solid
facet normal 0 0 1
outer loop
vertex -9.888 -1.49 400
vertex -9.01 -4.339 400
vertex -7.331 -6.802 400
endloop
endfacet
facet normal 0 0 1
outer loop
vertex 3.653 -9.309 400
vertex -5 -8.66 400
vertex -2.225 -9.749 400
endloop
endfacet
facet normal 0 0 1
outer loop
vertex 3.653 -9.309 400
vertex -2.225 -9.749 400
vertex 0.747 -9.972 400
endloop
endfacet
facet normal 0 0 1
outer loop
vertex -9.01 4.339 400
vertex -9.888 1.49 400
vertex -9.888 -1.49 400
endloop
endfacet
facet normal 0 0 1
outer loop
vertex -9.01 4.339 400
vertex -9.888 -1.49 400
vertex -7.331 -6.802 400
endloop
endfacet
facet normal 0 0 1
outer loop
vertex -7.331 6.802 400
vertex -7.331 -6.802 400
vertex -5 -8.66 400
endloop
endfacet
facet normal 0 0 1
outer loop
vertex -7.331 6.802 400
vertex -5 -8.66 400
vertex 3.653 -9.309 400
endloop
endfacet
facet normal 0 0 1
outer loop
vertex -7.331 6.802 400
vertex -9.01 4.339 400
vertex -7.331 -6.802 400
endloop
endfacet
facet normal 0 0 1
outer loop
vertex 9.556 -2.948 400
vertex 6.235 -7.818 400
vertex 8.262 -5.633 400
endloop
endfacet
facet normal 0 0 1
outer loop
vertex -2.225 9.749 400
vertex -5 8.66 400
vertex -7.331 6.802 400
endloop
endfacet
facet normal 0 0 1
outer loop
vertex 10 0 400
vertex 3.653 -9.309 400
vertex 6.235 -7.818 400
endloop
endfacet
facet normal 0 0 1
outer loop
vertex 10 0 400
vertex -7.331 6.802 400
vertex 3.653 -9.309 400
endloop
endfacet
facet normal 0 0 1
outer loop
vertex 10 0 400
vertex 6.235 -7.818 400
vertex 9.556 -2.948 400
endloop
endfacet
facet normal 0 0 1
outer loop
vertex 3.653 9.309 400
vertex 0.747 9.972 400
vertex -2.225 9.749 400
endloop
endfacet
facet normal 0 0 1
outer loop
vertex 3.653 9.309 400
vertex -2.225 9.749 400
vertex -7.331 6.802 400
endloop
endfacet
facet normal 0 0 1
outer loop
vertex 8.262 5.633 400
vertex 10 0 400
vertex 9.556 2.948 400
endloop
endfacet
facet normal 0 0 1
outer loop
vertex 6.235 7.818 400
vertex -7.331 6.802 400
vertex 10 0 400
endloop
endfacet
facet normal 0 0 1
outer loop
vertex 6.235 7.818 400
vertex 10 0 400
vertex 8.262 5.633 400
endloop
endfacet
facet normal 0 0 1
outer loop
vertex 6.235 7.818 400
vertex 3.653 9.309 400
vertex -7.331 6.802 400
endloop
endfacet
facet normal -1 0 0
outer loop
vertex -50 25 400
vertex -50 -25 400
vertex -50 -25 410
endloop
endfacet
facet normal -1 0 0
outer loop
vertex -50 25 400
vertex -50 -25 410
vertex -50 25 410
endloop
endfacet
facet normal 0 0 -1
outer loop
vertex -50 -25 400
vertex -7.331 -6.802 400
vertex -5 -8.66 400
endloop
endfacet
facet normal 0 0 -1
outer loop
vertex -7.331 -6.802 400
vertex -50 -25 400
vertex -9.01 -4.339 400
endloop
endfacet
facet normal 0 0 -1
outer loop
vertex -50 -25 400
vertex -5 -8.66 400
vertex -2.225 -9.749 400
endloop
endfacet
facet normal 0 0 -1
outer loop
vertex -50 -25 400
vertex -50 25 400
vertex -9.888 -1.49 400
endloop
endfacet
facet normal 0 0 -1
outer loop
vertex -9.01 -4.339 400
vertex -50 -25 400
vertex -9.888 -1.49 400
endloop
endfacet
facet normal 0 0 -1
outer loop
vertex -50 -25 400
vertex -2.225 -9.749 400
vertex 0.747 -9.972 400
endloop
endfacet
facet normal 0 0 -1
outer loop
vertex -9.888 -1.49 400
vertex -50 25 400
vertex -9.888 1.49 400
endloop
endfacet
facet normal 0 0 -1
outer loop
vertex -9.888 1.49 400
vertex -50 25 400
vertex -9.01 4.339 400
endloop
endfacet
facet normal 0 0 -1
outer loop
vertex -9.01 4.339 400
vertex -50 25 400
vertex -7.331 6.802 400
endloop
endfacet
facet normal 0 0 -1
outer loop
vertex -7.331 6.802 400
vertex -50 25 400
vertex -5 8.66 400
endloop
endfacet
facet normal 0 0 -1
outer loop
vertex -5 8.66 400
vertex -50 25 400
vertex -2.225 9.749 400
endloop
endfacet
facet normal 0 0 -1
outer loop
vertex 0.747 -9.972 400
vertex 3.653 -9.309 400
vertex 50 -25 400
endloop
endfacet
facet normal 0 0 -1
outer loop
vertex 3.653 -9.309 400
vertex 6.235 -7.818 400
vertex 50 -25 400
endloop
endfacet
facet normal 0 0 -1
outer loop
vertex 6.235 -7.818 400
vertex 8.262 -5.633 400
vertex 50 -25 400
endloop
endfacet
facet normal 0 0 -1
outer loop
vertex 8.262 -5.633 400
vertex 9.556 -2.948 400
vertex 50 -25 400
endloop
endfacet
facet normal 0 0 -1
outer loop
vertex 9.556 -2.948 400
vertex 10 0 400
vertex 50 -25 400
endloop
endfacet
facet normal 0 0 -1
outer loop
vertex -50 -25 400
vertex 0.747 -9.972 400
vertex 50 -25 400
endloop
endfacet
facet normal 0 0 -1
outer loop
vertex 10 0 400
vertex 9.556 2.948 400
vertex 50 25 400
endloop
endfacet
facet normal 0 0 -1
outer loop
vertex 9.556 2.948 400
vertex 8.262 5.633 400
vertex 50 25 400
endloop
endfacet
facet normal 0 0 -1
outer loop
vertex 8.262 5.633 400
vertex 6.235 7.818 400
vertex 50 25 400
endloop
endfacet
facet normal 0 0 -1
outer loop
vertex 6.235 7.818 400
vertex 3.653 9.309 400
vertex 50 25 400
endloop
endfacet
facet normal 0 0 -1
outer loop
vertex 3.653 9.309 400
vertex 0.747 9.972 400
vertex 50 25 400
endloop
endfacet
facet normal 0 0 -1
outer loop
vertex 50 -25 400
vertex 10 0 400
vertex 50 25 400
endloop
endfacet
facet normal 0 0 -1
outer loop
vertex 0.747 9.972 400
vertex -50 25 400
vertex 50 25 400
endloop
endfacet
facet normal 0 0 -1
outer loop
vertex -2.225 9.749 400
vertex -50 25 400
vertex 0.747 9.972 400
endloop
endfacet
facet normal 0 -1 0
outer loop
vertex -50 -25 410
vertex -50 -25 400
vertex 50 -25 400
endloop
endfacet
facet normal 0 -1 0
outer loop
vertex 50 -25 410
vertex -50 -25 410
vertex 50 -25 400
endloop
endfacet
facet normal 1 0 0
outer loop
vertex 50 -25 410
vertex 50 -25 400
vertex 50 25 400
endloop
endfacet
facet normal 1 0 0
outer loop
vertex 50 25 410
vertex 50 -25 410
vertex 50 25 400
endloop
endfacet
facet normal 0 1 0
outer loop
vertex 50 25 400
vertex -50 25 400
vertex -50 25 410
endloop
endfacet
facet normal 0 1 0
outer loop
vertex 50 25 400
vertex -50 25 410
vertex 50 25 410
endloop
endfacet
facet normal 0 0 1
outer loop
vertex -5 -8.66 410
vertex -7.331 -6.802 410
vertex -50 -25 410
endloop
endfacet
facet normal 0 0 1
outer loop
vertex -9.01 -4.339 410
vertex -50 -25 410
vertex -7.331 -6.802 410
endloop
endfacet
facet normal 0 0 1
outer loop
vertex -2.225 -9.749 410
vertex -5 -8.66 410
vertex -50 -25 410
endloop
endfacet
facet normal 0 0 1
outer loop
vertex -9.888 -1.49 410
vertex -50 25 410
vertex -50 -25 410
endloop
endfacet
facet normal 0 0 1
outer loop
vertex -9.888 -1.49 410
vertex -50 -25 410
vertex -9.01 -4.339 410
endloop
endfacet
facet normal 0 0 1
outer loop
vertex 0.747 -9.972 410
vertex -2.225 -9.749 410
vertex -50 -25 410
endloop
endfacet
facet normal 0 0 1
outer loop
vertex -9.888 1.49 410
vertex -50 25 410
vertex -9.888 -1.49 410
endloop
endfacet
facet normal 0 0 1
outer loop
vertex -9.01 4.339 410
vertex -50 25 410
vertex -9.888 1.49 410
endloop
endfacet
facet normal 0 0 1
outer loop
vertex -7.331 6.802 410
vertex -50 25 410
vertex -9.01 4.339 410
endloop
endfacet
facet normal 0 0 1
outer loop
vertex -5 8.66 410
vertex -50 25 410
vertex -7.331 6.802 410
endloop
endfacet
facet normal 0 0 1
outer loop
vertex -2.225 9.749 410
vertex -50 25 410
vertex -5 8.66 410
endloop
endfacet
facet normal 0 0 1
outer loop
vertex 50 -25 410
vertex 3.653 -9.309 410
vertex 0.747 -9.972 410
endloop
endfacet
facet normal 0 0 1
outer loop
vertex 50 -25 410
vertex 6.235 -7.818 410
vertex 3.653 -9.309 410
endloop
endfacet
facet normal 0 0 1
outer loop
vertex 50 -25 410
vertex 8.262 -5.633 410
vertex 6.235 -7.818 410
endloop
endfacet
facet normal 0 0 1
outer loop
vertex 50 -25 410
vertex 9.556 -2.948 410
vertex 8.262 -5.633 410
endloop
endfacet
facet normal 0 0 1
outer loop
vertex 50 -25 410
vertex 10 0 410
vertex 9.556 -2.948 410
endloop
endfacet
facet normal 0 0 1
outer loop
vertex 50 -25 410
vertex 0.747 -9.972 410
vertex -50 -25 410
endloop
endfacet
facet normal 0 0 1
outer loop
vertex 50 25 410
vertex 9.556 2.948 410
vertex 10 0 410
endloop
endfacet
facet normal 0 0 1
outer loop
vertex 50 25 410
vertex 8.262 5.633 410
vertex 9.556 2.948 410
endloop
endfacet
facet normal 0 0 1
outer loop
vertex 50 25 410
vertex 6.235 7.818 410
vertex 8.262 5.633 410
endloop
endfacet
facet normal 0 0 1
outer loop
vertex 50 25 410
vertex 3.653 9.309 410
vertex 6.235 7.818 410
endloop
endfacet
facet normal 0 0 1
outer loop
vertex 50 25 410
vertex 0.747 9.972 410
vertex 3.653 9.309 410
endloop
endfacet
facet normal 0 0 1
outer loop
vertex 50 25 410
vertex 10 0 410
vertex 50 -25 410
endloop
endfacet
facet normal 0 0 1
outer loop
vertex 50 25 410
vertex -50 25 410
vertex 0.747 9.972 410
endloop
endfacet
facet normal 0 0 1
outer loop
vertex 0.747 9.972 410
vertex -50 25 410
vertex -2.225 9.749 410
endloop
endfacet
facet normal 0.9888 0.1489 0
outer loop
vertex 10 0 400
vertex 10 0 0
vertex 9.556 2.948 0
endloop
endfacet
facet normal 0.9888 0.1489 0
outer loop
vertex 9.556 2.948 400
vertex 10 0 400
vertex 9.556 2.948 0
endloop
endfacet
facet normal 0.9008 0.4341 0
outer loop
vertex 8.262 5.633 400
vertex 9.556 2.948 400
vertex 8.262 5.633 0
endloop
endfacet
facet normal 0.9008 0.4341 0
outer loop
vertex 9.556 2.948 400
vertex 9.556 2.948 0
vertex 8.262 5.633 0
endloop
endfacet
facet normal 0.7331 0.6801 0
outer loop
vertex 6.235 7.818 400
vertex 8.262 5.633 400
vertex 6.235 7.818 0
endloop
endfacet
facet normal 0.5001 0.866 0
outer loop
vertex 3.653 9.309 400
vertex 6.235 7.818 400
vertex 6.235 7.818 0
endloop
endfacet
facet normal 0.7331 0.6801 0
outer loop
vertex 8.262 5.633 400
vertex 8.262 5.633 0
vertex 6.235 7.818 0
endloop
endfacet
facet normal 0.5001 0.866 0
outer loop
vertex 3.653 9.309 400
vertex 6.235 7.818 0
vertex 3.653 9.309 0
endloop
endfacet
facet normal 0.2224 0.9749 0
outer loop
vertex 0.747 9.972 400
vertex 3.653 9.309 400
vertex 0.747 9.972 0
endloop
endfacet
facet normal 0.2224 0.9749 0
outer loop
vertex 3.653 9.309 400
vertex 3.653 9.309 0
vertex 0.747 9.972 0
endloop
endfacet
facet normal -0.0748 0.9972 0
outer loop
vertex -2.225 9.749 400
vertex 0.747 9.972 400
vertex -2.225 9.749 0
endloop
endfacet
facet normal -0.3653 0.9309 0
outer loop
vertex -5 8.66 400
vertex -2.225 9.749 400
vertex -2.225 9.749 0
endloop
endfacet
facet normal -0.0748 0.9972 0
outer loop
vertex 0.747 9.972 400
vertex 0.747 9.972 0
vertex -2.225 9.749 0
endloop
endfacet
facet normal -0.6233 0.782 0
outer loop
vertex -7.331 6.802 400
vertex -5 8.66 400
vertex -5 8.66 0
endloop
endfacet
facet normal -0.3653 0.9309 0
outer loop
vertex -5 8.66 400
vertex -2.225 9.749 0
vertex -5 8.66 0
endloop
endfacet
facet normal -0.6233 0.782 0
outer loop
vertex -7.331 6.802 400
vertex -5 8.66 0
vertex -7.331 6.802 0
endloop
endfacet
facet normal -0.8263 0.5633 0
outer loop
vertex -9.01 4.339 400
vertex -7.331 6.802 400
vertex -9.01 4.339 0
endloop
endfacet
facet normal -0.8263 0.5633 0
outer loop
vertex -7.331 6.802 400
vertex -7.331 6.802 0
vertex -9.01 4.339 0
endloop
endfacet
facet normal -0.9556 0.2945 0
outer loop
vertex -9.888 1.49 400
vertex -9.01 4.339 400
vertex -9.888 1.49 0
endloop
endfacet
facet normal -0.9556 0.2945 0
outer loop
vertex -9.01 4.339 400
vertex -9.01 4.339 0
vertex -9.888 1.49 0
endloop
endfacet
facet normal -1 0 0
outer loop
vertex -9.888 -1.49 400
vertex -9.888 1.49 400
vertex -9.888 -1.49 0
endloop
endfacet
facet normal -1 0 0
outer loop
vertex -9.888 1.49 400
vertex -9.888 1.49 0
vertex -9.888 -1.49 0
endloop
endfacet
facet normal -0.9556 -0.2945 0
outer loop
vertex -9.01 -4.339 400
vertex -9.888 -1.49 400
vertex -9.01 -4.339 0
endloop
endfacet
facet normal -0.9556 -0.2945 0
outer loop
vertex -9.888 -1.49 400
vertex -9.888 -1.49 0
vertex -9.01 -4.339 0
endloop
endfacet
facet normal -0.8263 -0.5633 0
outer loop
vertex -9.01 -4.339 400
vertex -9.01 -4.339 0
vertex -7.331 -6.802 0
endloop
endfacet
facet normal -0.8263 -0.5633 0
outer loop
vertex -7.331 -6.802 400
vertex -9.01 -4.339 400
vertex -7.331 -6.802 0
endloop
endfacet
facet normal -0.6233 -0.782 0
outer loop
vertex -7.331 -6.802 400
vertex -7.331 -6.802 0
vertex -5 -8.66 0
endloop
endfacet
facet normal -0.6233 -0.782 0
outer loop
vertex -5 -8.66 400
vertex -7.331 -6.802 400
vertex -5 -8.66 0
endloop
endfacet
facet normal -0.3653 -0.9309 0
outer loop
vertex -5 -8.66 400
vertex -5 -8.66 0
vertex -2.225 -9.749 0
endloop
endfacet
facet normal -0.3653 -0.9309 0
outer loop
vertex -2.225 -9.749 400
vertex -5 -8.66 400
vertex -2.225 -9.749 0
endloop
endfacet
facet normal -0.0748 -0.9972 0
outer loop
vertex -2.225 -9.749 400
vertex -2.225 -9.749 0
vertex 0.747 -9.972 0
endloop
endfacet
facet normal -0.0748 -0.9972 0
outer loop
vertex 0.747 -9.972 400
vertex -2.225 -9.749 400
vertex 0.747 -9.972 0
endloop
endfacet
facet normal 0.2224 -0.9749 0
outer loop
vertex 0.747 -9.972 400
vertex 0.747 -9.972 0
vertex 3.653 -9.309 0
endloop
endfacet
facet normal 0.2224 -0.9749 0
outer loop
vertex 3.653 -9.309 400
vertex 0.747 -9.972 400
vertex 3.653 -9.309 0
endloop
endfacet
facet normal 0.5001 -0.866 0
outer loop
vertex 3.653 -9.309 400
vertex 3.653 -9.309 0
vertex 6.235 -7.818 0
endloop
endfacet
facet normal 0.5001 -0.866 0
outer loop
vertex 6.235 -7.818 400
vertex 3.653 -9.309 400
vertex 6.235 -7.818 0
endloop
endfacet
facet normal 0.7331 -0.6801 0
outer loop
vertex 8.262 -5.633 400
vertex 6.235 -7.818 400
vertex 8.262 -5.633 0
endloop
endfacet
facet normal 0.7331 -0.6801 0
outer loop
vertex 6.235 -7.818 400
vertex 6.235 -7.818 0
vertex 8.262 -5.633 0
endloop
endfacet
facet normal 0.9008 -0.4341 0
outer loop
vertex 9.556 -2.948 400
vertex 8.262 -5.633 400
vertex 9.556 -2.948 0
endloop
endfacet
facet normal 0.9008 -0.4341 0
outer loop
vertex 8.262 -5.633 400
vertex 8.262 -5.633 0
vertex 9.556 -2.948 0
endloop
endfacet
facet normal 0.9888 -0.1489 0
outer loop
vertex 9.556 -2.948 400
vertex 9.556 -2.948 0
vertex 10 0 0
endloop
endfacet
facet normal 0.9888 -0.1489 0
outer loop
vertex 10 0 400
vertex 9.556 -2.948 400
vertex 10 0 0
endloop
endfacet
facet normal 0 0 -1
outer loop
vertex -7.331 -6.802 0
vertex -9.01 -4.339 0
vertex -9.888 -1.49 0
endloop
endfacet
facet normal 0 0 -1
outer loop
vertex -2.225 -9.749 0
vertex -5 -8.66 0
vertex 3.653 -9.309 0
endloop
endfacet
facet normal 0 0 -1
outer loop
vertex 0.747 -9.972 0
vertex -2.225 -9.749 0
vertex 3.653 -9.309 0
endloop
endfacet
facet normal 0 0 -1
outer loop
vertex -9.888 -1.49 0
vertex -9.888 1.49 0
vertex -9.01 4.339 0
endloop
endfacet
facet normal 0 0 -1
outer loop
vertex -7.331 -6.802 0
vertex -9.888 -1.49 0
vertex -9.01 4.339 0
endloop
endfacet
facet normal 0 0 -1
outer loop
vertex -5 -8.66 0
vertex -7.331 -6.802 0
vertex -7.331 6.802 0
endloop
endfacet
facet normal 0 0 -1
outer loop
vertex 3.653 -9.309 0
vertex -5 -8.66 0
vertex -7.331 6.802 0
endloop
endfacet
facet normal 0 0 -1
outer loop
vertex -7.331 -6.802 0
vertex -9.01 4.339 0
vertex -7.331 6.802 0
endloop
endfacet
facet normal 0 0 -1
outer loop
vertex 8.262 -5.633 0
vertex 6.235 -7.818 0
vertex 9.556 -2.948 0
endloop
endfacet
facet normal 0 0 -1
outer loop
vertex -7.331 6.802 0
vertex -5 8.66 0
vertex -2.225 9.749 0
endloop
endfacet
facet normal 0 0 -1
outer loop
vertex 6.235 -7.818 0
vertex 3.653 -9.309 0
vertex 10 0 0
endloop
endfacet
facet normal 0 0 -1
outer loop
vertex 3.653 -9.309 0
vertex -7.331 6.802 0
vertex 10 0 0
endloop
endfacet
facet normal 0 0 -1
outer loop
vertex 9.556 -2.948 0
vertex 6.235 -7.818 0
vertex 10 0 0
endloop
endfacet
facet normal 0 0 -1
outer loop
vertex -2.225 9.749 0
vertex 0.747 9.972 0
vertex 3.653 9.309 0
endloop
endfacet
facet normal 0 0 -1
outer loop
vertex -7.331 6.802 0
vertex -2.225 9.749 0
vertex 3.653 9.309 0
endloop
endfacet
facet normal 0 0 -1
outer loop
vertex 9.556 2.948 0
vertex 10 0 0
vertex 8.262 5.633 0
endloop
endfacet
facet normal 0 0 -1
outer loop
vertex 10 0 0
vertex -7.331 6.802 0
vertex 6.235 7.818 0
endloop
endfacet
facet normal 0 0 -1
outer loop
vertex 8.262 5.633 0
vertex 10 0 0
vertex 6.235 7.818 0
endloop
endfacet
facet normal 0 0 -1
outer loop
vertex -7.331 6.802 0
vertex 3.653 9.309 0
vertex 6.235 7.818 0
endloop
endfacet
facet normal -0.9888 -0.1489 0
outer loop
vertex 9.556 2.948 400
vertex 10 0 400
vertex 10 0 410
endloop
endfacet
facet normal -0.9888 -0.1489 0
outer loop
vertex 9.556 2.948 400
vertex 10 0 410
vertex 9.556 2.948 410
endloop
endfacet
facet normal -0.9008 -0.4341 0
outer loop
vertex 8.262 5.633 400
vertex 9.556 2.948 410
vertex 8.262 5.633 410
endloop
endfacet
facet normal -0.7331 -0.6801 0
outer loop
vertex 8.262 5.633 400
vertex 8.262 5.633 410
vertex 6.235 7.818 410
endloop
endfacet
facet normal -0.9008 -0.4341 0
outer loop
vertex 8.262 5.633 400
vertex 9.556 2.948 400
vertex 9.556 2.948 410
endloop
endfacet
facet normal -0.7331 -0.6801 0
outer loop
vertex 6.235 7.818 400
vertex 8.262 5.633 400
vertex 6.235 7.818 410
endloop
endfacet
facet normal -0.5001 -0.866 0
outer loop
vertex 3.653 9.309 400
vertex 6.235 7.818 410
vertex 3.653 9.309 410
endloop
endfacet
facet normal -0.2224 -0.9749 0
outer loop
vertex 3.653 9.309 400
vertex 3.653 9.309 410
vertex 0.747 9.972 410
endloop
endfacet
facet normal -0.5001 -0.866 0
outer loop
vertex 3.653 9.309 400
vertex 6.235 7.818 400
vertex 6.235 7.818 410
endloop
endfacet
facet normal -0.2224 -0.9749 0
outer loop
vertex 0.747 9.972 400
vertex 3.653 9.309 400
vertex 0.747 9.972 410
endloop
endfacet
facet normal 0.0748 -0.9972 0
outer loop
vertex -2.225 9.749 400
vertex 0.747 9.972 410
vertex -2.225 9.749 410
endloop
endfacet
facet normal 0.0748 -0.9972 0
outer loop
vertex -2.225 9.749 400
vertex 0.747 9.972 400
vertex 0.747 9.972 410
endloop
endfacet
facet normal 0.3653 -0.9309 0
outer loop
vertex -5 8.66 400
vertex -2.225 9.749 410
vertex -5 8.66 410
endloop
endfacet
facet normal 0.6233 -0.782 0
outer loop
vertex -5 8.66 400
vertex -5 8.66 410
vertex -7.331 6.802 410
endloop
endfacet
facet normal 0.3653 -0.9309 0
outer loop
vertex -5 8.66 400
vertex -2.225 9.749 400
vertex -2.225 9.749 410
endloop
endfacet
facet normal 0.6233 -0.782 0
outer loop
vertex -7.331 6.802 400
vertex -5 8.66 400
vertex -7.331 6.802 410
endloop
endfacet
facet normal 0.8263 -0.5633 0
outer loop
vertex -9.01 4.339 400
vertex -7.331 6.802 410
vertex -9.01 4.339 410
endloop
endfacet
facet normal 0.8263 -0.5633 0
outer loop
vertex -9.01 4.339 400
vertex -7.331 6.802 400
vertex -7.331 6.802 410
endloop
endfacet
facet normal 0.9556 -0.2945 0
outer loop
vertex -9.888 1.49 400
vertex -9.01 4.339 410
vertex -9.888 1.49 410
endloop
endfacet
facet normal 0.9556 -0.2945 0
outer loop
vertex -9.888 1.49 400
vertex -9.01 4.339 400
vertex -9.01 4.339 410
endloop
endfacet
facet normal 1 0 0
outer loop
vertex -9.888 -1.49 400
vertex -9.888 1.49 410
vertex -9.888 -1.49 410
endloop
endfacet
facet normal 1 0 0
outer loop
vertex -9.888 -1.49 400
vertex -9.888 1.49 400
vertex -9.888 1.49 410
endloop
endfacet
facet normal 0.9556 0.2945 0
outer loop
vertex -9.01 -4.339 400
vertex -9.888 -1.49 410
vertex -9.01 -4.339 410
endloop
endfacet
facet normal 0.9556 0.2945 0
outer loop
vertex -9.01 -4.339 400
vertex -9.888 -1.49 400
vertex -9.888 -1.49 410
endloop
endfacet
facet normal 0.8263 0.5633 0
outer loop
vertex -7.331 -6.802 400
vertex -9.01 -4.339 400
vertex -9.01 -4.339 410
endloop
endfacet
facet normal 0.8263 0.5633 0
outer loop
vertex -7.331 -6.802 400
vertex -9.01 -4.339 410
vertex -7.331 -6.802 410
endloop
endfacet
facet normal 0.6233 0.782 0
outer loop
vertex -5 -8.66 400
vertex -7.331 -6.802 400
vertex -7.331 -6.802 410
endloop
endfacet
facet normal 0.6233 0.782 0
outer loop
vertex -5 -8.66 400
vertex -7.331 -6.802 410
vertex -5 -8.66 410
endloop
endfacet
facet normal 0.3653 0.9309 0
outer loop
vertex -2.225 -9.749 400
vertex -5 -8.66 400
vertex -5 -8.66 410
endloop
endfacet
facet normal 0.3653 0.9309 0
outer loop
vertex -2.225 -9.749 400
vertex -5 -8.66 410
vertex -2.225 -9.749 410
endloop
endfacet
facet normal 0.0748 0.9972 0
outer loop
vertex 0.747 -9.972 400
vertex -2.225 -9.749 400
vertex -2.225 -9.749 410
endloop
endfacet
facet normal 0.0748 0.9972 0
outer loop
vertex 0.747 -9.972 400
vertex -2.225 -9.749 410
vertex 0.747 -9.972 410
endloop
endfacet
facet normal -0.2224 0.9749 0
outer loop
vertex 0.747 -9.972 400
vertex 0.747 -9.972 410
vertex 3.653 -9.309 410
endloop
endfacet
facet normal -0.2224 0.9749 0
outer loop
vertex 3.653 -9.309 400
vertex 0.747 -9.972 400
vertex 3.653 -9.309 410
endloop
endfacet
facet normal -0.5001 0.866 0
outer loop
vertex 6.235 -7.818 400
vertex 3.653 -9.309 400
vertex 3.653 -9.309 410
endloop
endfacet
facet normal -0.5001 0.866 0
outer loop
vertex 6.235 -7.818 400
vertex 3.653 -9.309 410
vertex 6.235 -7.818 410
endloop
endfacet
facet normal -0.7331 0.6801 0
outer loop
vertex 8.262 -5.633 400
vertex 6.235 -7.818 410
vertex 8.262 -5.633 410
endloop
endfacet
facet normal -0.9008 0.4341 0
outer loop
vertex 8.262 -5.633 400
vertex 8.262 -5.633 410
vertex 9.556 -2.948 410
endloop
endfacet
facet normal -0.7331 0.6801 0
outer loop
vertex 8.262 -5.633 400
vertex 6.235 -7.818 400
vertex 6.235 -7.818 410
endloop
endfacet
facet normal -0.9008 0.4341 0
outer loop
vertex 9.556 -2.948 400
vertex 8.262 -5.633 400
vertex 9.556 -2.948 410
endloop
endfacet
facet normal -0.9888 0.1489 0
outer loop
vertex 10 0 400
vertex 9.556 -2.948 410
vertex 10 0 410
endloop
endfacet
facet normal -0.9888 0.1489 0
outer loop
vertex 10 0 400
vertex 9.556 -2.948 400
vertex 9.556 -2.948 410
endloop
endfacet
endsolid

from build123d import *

# Parameters (mm, degrees)
SKETCH_1_R      = 10
EXTRUDE_1_DEPTH = 400
SKETCH_2_W      = 100
SKETCH_2_H      = 50
SKETCH_2_R      = 10
EXTRUDE_2_DEPTH = 10


with BuildPart() as part:
    # 草图1 → 凸台-拉伸1 (new body)
    with BuildSketch(Plane.XY):
        Circle(SKETCH_1_R)
    extrude(amount=EXTRUDE_1_DEPTH)


with BuildPart() as body_2:
    # 草图2 → 凸台-拉伸2 (new body)
    with BuildSketch(Plane.XY.offset(400)):
        Rectangle(SKETCH_2_W, SKETCH_2_H)
        Circle(SKETCH_2_R, mode=Mode.SUBTRACT)
    extrude(amount=EXTRUDE_2_DEPTH)


solid = Compound([part.part, body_2.part])
